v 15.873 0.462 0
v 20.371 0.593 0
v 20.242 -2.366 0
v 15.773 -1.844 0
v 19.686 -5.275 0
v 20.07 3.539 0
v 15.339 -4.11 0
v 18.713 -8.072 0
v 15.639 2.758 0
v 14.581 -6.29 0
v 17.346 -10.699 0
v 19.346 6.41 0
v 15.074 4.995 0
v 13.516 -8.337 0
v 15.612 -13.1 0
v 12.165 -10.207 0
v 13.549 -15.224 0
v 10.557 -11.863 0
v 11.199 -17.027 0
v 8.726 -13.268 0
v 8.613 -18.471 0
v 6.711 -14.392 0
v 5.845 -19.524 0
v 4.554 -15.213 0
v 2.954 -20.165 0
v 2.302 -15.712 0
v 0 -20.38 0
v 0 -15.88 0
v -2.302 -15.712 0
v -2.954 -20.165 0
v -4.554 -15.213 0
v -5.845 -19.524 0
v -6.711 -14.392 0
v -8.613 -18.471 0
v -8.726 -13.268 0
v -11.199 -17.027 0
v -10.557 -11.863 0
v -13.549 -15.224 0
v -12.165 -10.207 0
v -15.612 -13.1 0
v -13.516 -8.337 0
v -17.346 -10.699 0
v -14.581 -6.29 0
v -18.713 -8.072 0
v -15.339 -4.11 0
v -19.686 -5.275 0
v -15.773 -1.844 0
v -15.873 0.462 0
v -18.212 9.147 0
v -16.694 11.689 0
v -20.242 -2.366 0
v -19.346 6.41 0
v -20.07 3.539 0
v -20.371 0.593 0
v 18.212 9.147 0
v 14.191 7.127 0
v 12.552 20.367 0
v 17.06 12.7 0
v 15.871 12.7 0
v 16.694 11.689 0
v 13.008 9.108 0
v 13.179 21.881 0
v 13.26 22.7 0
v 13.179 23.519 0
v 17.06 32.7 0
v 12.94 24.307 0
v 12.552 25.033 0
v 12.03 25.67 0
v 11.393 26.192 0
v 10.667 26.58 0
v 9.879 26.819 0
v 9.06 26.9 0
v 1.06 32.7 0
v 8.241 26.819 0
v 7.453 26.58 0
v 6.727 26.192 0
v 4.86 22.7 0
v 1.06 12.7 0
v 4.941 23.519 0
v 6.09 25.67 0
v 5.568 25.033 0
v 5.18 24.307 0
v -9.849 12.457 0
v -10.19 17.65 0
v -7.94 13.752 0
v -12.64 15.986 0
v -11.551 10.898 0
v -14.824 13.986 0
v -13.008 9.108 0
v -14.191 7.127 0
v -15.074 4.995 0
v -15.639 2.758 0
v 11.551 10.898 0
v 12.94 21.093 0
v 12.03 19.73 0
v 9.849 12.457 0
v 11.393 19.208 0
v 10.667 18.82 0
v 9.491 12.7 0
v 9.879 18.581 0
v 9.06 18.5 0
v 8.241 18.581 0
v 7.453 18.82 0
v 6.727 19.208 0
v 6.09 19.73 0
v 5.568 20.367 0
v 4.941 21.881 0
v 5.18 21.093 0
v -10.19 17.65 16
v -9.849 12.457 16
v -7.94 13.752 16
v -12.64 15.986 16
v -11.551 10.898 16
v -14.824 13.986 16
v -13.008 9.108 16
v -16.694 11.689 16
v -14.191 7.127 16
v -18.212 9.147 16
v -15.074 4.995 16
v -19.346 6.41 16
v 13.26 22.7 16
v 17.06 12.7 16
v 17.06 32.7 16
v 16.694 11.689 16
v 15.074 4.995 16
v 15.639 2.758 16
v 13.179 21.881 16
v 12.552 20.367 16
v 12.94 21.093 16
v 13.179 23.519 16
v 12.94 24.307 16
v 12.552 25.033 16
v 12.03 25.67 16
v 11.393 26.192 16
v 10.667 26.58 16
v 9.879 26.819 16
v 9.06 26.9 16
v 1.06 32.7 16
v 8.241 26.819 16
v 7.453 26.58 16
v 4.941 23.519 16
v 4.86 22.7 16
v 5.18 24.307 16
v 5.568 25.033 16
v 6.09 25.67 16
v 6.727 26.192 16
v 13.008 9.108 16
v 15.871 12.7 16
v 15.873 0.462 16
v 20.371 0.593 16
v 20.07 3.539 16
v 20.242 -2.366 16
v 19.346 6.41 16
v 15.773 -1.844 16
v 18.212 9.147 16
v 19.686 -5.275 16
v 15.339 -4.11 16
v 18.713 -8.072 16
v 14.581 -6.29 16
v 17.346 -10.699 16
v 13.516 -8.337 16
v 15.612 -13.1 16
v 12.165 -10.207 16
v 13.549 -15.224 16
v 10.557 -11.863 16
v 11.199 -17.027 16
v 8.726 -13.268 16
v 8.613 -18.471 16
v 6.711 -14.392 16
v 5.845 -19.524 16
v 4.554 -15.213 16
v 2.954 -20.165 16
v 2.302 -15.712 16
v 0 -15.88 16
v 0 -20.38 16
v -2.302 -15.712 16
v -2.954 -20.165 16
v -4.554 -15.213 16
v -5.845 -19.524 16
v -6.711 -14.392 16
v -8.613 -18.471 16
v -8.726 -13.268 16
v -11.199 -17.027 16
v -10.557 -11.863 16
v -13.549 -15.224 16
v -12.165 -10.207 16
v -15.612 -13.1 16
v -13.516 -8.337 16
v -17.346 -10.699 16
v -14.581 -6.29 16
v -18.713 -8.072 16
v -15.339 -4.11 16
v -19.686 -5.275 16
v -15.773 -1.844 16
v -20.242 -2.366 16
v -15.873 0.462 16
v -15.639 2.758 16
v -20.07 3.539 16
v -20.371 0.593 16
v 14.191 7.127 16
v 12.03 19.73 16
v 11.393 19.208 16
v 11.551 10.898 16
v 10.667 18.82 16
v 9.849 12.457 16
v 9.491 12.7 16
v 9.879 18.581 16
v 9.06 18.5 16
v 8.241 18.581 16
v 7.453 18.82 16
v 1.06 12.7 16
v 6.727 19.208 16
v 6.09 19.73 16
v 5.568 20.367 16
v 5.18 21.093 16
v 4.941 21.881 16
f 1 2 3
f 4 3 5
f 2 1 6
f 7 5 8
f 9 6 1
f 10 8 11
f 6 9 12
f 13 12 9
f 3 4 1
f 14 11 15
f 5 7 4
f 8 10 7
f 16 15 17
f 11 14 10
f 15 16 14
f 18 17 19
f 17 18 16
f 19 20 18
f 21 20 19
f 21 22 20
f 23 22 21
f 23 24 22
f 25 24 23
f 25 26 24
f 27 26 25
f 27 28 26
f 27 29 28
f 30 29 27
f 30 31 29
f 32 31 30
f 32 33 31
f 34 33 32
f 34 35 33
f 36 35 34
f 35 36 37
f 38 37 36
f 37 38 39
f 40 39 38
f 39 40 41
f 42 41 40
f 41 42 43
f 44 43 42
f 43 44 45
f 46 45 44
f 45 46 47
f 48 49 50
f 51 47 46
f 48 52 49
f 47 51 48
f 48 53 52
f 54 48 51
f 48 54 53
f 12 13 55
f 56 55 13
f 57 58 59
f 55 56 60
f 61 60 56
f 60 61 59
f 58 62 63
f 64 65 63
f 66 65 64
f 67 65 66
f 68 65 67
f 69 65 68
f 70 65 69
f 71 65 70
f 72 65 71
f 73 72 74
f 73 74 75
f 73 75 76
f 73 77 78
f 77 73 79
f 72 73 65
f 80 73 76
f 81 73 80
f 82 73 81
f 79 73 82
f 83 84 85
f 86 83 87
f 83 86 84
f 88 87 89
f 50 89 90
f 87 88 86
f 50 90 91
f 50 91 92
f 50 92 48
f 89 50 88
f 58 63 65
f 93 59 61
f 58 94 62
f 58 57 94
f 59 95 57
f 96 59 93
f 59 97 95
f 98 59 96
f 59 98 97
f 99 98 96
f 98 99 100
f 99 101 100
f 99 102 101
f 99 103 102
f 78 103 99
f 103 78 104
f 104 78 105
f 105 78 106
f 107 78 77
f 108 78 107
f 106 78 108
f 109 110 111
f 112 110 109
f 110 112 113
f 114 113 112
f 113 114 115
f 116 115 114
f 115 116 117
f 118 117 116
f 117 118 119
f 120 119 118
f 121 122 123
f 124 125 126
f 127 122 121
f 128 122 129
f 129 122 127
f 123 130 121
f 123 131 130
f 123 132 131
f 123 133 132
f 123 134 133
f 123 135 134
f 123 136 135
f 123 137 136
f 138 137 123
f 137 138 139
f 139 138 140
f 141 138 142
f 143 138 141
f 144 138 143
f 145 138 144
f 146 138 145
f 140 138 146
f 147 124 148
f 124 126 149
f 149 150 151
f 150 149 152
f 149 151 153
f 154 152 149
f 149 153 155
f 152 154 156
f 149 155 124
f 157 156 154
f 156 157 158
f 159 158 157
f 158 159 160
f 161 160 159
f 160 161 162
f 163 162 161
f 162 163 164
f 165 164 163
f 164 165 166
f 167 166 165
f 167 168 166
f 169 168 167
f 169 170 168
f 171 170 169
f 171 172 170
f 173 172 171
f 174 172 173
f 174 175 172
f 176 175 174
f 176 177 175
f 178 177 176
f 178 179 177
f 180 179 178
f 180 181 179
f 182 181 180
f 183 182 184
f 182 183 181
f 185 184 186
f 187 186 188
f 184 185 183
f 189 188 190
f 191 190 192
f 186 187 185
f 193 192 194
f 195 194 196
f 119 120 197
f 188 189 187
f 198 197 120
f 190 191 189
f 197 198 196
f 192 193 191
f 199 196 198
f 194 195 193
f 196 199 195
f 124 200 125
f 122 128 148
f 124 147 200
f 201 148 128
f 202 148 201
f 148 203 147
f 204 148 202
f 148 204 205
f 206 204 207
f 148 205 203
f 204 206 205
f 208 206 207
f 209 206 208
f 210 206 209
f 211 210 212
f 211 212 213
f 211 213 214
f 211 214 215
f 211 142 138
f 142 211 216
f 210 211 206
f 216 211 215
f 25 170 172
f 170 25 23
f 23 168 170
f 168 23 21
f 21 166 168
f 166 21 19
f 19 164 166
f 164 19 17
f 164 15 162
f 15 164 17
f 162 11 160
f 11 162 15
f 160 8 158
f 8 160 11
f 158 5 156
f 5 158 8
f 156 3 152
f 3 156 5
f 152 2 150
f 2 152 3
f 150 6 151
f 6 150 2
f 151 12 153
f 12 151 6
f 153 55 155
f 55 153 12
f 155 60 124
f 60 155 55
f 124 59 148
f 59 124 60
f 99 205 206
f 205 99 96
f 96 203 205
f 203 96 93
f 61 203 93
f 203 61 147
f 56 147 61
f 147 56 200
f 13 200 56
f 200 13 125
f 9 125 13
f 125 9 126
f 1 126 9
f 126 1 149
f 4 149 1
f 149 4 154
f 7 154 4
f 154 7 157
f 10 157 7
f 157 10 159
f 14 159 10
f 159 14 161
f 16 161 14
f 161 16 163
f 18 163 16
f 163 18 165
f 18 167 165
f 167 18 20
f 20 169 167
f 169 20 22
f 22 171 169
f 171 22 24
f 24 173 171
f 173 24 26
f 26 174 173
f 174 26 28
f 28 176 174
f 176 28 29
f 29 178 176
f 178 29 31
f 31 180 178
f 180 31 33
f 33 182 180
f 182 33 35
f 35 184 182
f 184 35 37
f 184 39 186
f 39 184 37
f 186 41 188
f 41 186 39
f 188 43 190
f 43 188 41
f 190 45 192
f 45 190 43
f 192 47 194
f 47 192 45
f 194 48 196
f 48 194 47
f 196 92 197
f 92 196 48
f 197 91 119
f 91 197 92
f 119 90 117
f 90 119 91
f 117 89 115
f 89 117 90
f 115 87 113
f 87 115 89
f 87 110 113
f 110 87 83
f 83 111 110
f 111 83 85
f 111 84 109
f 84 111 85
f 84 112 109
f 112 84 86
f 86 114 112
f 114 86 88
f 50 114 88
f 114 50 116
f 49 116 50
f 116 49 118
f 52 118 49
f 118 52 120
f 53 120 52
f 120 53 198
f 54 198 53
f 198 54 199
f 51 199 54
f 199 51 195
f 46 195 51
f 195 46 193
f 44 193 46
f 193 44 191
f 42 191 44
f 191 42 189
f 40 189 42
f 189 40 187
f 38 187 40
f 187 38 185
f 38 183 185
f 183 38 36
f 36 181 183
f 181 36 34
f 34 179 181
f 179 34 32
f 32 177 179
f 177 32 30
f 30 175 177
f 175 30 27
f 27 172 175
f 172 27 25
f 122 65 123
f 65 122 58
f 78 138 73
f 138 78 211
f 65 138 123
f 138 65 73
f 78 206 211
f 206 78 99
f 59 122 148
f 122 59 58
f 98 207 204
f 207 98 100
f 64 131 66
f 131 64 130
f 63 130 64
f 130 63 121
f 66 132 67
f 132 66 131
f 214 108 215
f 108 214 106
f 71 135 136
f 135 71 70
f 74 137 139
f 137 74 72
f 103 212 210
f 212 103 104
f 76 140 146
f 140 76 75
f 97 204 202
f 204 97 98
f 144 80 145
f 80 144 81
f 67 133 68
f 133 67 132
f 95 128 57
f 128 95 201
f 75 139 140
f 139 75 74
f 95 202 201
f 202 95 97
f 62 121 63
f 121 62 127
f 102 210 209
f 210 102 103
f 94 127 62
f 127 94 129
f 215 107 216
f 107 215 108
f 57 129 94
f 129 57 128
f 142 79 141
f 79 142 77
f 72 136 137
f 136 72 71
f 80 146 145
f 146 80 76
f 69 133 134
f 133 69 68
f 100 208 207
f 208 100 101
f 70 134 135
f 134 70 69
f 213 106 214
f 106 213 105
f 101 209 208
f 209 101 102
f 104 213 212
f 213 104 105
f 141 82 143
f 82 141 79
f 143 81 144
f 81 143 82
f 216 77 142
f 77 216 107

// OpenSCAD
$fn = 32;

// ----------------------------------------------------------------------
// Pipe clamp: 40.76 mm ring, 4.5 mm wall, 16 mm wide
// ----------------------------------------------------------------------

// --- parameters (mm) ---
outer_r = 20.38;          // clamp outside radius
inner_r = 15.88;          // pipe bore radius
band = 4.5;               // band thickness
clamp_w = 16;             // clamp width
opening = 60;             // opening angle between the ends
lug_w = 16;               // lug width
lug_len = 20;             // lug length
bolt_d = 8.4;             // bolt hole

clamp_profile = [[-10.19, 17.65], [-12.64, 15.986], [-14.824, 13.986], [-16.694, 11.689], [-18.212, 9.147], [-19.346, 6.41], [-20.07, 3.539], [-20.371, 0.593], [-20.242, -2.366], [-19.686, -5.275], [-18.713, -8.072], [-17.346, -10.699], [-15.612, -13.1], [-13.549, -15.224], [-11.199, -17.027], [-8.613, -18.471], [-5.845, -19.524], [-2.954, -20.165], [0, -20.38], [2.954, -20.165], [5.845, -19.524], [8.613, -18.471], [11.199, -17.027], [13.549, -15.224], [15.612, -13.1], [17.346, -10.699], [18.713, -8.072], [19.686, -5.275], [20.242, -2.366], [20.371, 0.593], [20.07, 3.539], [19.346, 6.41], [18.212, 9.147], [16.694, 11.689], [14.824, 13.986], [12.64, 15.986], [10.19, 17.65], [7.94, 13.752], [9.849, 12.457], [11.551, 10.898], [13.008, 9.108], [14.191, 7.127], [15.074, 4.995], [15.639, 2.758], [15.873, 0.462], [15.773, -1.844], [15.339, -4.11], [14.581, -6.29], [13.516, -8.337], [12.165, -10.207], [10.557, -11.863], [8.726, -13.268], [6.711, -14.392], [4.554, -15.213], [2.302, -15.712], [0, -15.88], [-2.302, -15.712], [-4.554, -15.213], [-6.711, -14.392], [-8.726, -13.268], [-10.557, -11.863], [-12.165, -10.207], [-13.516, -8.337], [-14.581, -6.29], [-15.339, -4.11], [-15.773, -1.844], [-15.873, 0.462], [-15.639, 2.758], [-15.074, 4.995], [-14.191, 7.127], [-13.008, 9.108], [-11.551, 10.898], [-9.849, 12.457], [-7.94, 13.752]];

difference() {
  union() {
    linear_extrude(height = clamp_w) polygon(clamp_profile);
    /* bolt lug on the other end */
    translate([1.06, 12.7, 0]) cube([lug_w, 20, clamp_w]);
  }
  translate([9.06, 22.7, -2.5]) cylinder(h = clamp_w + 5, d = bolt_d);
}
